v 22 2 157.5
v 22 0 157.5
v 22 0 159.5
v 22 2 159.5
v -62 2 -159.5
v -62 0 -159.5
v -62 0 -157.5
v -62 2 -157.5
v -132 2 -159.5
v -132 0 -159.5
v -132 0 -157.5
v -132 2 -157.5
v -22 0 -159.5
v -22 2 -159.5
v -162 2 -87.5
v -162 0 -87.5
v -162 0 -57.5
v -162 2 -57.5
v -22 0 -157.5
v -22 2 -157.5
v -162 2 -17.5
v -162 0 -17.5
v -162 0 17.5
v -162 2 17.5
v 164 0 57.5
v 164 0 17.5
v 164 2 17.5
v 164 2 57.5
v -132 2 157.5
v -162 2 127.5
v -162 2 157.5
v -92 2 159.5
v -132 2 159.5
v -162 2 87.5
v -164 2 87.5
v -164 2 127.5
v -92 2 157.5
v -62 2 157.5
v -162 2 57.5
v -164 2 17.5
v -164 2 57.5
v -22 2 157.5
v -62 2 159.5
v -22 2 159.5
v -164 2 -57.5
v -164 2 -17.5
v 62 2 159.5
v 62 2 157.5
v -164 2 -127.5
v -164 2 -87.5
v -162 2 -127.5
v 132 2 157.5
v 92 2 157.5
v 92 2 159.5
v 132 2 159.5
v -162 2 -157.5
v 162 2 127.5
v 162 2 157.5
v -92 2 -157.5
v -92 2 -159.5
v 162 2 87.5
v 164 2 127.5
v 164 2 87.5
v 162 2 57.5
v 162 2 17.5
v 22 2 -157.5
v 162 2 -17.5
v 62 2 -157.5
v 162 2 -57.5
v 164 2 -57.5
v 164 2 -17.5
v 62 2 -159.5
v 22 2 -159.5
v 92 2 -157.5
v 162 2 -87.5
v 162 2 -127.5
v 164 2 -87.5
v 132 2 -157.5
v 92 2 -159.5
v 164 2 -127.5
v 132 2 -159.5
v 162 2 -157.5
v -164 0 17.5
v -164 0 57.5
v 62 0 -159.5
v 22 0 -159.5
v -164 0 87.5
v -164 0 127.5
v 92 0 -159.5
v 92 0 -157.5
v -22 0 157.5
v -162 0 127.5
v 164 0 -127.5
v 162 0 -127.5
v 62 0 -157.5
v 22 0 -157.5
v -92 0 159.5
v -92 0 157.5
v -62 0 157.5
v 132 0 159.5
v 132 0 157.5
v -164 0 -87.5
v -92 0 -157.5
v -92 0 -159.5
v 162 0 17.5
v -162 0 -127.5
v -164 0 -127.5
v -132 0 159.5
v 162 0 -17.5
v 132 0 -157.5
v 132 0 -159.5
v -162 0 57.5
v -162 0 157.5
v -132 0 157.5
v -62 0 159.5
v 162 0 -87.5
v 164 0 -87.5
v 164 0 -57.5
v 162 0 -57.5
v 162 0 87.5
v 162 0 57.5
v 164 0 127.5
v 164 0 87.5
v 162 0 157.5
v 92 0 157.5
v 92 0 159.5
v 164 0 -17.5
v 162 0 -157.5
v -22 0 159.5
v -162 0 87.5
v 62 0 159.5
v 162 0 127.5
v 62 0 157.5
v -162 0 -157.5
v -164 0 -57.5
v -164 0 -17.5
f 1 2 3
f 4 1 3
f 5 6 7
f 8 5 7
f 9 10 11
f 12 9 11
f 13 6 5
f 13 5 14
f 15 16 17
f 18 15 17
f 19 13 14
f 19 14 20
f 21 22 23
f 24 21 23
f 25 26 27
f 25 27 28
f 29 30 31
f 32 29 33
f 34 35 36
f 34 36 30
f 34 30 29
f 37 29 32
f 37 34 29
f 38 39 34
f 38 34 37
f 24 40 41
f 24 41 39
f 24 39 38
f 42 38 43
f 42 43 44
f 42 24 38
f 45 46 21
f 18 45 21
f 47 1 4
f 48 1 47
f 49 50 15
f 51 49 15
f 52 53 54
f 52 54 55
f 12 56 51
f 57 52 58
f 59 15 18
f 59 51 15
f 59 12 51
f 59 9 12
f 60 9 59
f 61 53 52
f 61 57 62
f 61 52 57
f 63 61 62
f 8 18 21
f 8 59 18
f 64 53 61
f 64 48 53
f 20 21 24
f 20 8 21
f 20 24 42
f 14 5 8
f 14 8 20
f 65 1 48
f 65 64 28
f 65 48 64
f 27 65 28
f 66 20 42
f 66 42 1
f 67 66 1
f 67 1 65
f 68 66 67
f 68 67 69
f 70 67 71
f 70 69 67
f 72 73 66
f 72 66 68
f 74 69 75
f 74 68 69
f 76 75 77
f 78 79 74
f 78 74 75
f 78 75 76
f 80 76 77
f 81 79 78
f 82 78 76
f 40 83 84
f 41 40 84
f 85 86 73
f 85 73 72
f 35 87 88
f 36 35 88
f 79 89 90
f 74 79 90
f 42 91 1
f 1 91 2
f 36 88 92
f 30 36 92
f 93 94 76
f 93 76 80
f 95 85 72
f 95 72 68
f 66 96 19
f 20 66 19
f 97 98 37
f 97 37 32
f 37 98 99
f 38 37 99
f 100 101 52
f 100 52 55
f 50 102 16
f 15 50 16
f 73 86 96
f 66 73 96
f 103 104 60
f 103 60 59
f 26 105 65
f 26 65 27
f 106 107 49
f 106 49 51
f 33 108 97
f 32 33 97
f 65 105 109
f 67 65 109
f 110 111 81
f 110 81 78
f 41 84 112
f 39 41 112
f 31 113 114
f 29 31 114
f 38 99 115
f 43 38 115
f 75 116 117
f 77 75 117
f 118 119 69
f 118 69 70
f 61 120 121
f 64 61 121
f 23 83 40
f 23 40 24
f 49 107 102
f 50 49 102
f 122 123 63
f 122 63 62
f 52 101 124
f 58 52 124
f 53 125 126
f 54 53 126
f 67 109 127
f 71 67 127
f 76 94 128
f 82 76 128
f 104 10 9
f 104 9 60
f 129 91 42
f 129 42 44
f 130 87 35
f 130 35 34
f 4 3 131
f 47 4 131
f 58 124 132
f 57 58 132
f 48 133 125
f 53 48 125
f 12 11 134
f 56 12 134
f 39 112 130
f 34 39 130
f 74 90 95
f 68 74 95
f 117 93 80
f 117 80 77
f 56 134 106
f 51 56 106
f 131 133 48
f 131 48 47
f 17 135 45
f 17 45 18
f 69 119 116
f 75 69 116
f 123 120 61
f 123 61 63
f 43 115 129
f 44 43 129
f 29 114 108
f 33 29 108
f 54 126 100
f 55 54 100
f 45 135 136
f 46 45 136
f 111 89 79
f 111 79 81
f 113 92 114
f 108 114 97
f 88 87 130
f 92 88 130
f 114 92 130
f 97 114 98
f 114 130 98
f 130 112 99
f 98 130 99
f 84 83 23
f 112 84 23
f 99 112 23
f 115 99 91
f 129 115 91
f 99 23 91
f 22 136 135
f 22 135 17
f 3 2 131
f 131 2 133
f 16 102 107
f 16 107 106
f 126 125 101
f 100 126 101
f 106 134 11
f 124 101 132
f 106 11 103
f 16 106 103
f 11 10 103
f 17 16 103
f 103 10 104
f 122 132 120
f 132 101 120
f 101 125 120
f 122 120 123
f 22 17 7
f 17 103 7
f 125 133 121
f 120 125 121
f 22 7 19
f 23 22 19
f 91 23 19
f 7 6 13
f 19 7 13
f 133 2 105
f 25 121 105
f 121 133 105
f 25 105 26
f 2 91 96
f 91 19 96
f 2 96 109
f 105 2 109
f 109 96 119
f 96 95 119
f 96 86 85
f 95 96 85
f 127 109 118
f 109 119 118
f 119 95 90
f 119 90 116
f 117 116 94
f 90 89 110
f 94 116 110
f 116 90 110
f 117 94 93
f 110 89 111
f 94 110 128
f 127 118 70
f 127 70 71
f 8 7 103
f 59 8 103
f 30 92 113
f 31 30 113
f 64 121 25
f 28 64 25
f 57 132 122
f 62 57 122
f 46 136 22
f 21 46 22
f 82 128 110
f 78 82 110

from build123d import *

# Parameters (mm, degrees)
SKETCH1_R               = 4.25
BOSS_EXTRUDE1_DEPTH     = 2
CUT_EXTRUDE1_DEPTH      = 253.36927309
CUT_EXTRUDE1_DEPTH_BACK = 253.36927309
SKETCH2_W               = 130
SKETCH2_H               = 36
SKETCH5_W               = 2
SKETCH5_H               = 40
SKETCH5_W_2             = 40
SKETCH5_H_2             = 2
BOSS_EXTRUDE2_DEPTH     = 2


with BuildPart() as part:
    # Sketch1 → Boss-Extrude1 (new body)
    with BuildSketch(Plane(origin=(0, 0, 0), x_dir=(1, 0, 0), z_dir=(0, 1, 0))):
        Polygon((64, -157.5), (162, -157.5), (162, 157.5), (-162, 157.5), (-162, -157.5), (-66, -157.5), (-66, -193.5), (64, -193.5), align=None)
        with Locations(Location((-51, -175.5, 0), (0, 0, 270))):
            Circle(SKETCH1_R, mode=Mode.SUBTRACT)
        with Locations(Location((49, -175.5, 0), (0, 0, 270))):
            Circle(SKETCH1_R, mode=Mode.SUBTRACT)
    extrude(amount=BOSS_EXTRUDE1_DEPTH)

    # Sketch2 → Cut-Extrude1 (cut, two sides: drawn at the far end of the back side and taken through both)
    with BuildSketch(Plane(origin=(0, 2, 0), x_dir=(1, 0, 0), z_dir=(0, 1, 0)).offset(-CUT_EXTRUDE1_DEPTH_BACK)):
        with Locations((-1, -175.5)):
            Rectangle(SKETCH2_W, SKETCH2_H)
    extrude(amount=CUT_EXTRUDE1_DEPTH + CUT_EXTRUDE1_DEPTH_BACK, mode=Mode.SUBTRACT)

    # Sketch5 → Boss-Extrude2 (add)
    with BuildSketch(Plane.XZ):
        with Locations((-163, 107.5)):
            Rectangle(SKETCH5_W, SKETCH5_H)
        with Locations((-163, 37.5)):
            Rectangle(SKETCH5_W, SKETCH5_H)
        with Locations((-112, 158.5)):
            Rectangle(SKETCH5_W_2, SKETCH5_H_2)
        with Locations((-42, 158.5)):
            Rectangle(SKETCH5_W_2, SKETCH5_H_2)
        with Locations((-163, -107.5)):
            Rectangle(SKETCH5_W, SKETCH5_H)
        with Locations((-163, -37.5)):
            Rectangle(SKETCH5_W, SKETCH5_H)
        with Locations((-112, -158.5)):
            Rectangle(SKETCH5_W_2, SKETCH5_H_2)
        with Locations((-42, -158.5)):
            Rectangle(SKETCH5_W_2, SKETCH5_H_2)
        with Locations((42, -158.5)):
            Rectangle(SKETCH5_W_2, SKETCH5_H_2)
        with Locations((112, -158.5)):
            Rectangle(SKETCH5_W_2, SKETCH5_H_2)
        with Locations((163, -37.5)):
            Rectangle(SKETCH5_W, SKETCH5_H)
        with Locations((163, -107.5)):
            Rectangle(SKETCH5_W, SKETCH5_H)
        with Locations((42, 158.5)):
            Rectangle(SKETCH5_W_2, SKETCH5_H_2)
        with Locations((112, 158.5)):
            Rectangle(SKETCH5_W_2, SKETCH5_H_2)
        with Locations((163, 37.5)):
            Rectangle(SKETCH5_W, SKETCH5_H)
        with Locations((163, 107.5)):
            Rectangle(SKETCH5_W, SKETCH5_H)
    extrude(amount=-BOSS_EXTRUDE2_DEPTH)


solid = part.part
